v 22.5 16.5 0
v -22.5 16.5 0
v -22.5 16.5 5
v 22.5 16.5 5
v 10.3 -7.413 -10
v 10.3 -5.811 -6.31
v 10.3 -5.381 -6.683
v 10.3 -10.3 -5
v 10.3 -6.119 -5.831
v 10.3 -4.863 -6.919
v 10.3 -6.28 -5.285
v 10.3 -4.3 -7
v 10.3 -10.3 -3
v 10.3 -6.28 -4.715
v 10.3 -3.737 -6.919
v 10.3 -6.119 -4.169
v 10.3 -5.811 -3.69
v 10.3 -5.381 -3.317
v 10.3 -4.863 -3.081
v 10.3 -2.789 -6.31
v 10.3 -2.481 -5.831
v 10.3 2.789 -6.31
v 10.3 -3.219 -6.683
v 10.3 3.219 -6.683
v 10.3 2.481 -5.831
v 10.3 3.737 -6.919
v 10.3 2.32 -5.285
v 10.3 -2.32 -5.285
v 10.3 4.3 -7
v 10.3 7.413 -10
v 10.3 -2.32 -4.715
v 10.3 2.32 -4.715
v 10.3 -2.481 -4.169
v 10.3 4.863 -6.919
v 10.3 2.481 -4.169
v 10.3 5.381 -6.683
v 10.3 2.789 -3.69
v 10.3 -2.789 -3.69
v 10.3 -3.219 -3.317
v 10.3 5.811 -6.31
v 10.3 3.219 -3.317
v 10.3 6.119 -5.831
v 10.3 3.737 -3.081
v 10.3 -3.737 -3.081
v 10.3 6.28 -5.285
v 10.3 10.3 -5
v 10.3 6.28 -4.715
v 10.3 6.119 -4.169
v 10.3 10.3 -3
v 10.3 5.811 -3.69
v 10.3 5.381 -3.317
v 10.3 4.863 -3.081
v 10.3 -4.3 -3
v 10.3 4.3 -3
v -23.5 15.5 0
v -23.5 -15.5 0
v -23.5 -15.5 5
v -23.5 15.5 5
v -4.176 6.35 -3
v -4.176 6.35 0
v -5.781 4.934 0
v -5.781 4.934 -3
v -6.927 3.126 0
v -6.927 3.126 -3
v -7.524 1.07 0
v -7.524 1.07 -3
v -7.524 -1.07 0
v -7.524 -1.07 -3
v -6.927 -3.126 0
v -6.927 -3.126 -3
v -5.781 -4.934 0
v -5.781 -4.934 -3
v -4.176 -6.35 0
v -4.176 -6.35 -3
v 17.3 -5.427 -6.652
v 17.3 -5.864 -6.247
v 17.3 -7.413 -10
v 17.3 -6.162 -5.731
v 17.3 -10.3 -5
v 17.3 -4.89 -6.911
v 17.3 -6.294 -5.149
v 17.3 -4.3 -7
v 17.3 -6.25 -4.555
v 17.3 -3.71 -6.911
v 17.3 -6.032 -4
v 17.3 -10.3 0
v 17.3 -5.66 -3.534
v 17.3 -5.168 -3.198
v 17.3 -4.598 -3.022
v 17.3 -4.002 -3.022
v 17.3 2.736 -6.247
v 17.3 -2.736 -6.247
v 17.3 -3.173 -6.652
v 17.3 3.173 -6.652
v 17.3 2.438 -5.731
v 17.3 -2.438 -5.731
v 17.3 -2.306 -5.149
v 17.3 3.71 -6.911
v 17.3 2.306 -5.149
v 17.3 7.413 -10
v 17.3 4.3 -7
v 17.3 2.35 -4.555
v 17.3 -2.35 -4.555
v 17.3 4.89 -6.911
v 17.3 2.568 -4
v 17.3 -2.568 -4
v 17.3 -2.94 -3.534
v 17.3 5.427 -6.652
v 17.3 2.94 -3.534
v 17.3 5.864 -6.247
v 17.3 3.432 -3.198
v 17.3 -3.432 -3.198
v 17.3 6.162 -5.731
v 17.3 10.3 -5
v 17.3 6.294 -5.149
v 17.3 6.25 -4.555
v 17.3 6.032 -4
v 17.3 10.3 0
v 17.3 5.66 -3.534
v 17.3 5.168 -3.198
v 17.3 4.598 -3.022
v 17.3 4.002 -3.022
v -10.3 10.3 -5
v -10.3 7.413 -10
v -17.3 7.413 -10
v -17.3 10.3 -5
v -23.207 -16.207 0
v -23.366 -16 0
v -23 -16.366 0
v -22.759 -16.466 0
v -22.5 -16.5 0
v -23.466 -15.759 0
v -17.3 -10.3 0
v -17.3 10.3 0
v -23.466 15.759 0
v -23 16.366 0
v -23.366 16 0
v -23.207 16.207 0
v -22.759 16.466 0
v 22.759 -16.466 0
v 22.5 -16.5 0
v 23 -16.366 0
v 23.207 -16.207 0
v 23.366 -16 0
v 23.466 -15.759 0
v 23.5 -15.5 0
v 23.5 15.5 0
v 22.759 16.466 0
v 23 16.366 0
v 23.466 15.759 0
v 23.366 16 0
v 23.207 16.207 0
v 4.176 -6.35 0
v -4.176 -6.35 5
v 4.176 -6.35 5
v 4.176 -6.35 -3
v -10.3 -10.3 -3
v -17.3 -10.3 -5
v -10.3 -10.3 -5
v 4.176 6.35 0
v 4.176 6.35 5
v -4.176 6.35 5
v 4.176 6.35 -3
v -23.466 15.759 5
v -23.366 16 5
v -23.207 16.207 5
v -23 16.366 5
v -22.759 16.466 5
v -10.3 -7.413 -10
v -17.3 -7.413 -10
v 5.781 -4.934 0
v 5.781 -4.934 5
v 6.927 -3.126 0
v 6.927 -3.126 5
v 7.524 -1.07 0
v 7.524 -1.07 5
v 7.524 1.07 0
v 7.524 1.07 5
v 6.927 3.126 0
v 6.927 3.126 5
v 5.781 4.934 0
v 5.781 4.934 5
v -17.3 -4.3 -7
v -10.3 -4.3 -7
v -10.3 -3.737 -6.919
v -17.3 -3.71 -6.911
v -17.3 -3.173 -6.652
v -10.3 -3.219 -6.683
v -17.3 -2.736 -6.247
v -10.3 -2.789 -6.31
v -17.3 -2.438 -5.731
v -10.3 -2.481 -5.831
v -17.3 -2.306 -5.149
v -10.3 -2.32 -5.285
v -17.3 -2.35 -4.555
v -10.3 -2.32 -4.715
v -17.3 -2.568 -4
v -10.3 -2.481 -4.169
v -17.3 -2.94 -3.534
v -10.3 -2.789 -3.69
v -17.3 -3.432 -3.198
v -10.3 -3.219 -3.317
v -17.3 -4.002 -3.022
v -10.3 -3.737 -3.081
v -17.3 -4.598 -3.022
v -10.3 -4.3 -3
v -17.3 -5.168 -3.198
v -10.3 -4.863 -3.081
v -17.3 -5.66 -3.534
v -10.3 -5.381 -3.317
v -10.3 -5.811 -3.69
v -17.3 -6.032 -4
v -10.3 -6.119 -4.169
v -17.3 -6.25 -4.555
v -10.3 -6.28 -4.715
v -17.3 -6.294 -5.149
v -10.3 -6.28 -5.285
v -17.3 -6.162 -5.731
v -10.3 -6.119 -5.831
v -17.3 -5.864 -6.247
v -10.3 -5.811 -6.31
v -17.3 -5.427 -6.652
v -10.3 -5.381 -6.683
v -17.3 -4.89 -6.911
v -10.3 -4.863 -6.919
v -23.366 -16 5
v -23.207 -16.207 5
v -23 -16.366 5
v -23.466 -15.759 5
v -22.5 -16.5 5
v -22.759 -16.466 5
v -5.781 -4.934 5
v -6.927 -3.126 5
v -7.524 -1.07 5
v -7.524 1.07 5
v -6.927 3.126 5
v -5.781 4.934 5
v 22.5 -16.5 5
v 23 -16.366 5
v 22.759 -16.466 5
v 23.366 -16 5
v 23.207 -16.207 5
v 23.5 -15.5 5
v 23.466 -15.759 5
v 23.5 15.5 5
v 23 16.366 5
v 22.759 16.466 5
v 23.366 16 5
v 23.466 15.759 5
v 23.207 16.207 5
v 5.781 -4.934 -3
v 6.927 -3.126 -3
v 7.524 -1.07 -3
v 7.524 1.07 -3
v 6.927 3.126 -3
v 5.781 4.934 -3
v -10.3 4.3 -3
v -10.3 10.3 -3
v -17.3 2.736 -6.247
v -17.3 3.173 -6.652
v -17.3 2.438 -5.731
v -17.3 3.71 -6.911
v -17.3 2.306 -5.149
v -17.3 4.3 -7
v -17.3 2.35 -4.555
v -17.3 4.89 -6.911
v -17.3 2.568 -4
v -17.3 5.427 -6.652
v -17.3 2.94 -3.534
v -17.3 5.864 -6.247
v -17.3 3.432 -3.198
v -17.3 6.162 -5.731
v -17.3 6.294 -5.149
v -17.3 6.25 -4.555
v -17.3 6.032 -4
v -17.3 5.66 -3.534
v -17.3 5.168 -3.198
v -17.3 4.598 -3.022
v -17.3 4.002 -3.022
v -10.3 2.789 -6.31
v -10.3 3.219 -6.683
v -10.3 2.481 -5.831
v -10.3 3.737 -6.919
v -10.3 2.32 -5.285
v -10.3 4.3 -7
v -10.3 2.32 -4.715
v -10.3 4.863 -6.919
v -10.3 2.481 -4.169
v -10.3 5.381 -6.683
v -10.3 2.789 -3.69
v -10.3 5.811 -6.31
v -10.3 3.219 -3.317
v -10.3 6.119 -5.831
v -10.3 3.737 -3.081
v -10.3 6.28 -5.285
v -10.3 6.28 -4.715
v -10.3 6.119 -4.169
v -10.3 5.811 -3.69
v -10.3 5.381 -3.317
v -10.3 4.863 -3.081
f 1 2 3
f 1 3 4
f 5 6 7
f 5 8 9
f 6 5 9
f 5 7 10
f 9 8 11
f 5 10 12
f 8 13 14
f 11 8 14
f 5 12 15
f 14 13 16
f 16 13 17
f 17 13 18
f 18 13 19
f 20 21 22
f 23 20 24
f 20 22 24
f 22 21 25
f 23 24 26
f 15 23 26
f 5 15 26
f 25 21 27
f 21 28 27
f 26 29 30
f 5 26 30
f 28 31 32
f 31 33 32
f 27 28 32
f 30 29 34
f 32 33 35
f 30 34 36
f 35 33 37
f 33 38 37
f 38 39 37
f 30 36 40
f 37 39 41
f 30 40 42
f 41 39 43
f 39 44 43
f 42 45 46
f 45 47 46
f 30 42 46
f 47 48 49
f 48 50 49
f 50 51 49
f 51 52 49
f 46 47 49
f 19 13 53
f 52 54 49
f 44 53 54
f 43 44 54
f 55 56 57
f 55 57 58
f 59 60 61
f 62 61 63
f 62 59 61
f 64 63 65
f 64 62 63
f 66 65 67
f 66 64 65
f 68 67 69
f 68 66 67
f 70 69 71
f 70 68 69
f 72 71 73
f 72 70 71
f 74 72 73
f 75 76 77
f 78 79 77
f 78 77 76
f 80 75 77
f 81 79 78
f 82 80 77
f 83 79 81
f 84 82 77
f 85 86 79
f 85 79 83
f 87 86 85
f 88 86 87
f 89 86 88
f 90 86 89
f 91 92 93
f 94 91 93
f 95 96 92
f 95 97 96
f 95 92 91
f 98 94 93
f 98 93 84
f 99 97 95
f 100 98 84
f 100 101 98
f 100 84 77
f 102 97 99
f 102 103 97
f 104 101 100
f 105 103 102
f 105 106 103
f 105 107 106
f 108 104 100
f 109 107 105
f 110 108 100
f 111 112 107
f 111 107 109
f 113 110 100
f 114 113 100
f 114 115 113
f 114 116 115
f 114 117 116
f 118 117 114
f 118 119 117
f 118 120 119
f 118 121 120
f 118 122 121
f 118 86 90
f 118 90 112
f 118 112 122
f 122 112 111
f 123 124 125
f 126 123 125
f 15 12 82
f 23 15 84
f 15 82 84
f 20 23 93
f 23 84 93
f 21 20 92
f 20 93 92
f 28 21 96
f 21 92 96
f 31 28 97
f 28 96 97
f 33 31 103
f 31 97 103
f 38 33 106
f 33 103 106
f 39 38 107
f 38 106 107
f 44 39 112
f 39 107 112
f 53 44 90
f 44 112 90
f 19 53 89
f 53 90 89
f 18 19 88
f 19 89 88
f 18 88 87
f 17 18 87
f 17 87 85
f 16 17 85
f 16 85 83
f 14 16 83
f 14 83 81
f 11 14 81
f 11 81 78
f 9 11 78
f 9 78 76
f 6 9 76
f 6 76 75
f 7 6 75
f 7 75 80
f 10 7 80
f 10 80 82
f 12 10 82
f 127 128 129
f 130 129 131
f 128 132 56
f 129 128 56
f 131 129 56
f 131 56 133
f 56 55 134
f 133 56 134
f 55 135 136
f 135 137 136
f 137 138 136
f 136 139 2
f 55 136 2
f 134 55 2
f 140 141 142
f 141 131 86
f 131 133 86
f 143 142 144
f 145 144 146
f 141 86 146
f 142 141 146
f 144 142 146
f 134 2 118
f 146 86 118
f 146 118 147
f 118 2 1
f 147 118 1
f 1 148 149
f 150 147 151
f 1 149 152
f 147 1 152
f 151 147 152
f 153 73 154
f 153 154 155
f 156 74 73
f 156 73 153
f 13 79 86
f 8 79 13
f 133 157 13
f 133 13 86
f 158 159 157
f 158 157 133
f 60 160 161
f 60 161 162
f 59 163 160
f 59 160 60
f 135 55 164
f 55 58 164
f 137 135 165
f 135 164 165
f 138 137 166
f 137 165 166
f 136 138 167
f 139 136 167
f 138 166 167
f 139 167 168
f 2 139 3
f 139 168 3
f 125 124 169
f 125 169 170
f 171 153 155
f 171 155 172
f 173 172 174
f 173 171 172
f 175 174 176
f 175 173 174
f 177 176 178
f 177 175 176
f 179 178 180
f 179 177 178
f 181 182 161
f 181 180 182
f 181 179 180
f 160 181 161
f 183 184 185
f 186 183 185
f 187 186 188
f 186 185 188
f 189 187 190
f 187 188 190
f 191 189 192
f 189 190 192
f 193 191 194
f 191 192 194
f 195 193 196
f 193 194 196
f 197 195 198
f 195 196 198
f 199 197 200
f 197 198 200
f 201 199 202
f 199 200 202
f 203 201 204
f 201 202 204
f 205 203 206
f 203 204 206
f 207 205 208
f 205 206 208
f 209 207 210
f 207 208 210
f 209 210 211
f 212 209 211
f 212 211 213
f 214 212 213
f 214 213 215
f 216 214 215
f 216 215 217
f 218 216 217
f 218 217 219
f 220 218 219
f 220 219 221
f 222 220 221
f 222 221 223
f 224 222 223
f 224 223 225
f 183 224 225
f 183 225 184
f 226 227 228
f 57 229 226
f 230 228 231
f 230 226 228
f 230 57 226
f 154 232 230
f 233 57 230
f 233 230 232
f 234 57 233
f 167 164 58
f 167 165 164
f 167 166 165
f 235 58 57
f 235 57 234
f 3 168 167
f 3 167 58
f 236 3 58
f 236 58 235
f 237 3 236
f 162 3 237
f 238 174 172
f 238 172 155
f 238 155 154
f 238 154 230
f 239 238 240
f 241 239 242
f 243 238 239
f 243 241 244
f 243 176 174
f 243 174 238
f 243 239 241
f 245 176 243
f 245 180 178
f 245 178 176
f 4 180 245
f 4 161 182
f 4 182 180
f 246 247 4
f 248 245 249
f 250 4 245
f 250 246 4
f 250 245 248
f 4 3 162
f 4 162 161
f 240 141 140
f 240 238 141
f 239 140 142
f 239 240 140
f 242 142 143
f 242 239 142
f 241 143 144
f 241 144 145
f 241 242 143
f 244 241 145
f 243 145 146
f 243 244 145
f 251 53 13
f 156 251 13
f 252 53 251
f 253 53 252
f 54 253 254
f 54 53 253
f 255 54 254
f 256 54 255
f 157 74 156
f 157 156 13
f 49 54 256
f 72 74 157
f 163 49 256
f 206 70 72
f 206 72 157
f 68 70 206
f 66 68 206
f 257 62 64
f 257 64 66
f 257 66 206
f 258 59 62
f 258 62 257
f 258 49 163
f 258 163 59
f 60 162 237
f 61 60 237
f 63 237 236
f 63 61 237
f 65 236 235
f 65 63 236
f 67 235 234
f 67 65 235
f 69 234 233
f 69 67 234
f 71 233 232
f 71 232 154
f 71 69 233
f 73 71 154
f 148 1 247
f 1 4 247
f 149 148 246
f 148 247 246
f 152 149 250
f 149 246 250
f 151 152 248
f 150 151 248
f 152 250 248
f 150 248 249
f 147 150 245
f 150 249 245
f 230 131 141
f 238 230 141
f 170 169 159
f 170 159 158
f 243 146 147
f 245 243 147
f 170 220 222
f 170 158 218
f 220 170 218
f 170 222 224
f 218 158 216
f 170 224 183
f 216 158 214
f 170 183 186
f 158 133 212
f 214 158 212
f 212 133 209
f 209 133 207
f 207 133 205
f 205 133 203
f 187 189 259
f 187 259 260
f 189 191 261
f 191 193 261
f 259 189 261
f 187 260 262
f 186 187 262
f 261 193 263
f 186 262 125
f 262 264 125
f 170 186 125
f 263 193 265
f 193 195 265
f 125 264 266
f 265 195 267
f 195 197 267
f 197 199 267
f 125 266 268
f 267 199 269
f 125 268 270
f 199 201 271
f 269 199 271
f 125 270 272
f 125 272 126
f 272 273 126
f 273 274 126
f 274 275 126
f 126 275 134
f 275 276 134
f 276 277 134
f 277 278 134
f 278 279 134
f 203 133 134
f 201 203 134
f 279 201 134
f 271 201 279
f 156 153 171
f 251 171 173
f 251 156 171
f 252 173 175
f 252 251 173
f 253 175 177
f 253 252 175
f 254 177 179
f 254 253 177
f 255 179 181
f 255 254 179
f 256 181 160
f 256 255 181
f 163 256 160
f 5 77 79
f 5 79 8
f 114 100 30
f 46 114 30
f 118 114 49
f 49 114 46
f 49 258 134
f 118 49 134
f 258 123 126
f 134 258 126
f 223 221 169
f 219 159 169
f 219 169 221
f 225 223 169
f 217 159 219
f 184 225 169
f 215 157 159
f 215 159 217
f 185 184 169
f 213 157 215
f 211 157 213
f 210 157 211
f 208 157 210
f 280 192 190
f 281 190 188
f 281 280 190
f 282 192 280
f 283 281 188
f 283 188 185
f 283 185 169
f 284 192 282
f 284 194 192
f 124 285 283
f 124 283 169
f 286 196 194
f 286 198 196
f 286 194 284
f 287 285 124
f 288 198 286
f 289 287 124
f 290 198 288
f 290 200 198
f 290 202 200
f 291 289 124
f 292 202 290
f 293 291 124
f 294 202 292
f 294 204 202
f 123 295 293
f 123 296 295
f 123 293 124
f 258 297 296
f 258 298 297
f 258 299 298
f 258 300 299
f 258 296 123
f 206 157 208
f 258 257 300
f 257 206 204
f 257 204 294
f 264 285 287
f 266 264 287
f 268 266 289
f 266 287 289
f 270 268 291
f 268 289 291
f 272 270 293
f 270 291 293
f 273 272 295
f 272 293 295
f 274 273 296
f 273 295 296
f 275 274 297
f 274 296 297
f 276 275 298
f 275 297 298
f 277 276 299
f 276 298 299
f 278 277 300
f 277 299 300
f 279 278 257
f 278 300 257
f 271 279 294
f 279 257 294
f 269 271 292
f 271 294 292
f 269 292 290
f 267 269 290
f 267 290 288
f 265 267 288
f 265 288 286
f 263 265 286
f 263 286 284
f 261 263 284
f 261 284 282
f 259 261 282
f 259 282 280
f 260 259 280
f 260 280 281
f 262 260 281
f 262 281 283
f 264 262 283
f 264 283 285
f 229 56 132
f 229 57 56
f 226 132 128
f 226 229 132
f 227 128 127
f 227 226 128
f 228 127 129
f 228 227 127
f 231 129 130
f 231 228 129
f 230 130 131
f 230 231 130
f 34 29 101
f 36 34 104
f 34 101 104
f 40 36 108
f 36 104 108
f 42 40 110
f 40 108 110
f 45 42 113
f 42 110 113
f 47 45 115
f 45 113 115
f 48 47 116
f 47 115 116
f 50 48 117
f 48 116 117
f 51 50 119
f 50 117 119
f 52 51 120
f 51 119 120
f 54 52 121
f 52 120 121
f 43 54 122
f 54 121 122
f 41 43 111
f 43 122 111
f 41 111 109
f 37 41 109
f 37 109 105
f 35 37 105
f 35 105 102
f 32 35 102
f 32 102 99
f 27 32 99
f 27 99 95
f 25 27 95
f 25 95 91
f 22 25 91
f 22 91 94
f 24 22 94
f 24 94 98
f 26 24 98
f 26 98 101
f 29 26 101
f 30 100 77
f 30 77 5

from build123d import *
from OCP.BRepFilletAPI import BRepFilletAPI_MakeChamfer

# Parameters (mm, degrees)
SZKIC1_W                    = 47
SZKIC1_H                    = 33
SZKIC1_R                    = 7.6
DODANIE_WYCI_GNI_CIE1_DEPTH = 5
SZKIC2_W                    = 7
SZKIC2_H                    = 20.6
DODANIE_WYCI_GNI_CIE2_DEPTH = 10
SFAZOWANIE1_SIZE            = 5
SFAZOWANIE1_SIZE2           = 2.886751346
SZKIC3_R                    = 2
WYTNIJ_WYCI_GNI_CIE1_DEPTH  = 46.131917752
ZAOKR_GLENIE1_R             = 1
DODANIE_WYCI_GNI_CIE4_START = 3
SZKIC5_W                    = 20.6
SZKIC5_H                    = 20.6
DODANIE_WYCI_GNI_CIE4_DEPTH = 3


with BuildPart() as part:
    # Szkic1 → Dodanie-wyciągnięcie1 (new body)
    # profile 1 of 3: a face of its own
    with BuildSketch(Plane.XY):
        Rectangle(SZKIC1_W, SZKIC1_H)
        Circle(SZKIC1_R, mode=Mode.SUBTRACT)
    # profile 2 of 3: a face of its own
    with BuildSketch(Plane.XY):
        with BuildLine():
            Line((4.175823272, -6.35), (-4.175823272, -6.35))
            ThreePointArc((-4.175823272, -6.35), (0, -7.6), (4.175823272, -6.35))
        make_face()
    # profile 3 of 3: a face of its own
    with BuildSketch(Plane.XY):
        with BuildLine():
            ThreePointArc((4.175823272, 6.35), (0, 7.6), (-4.175823272, 6.35))
            Line((-4.175823272, 6.35), (4.175823272, 6.35))
        make_face()
    extrude(amount=DODANIE_WYCI_GNI_CIE1_DEPTH)

    # Szkic2 → Dodanie-wyciągnięcie2 (add)
    with BuildSketch(Plane(origin=(0, 0, 0), x_dir=(-1, 0, 0), z_dir=(0, 0, -1))):
        with Locations((-13.8, 0)):
            Rectangle(SZKIC2_W, SZKIC2_H)
        with Locations((13.8, 0)):
            Rectangle(SZKIC2_W, SZKIC2_H)
    extrude(amount=DODANIE_WYCI_GNI_CIE2_DEPTH)

    # Sfazowanie1: one chamfer whose edges measure the first distance from different faces: ONE call of the kernel's chamfer builder (chamfer() names one face for all edges)
    sfazowanie1_edges_1 = [part.edges().sort_by_distance(p)[0] for p in [
        (13.8, 10.3, -10),
    ]]
    sfazowanie1_side_1 = [part.faces().sort_by_distance(p)[0] for p in [
        (13.8, 10.3, -5),
    ]]
    sfazowanie1_edges_2 = [part.edges().sort_by_distance(p)[0] for p in [
        (13.8, -10.3, -10),
    ]]
    sfazowanie1_side_2 = [part.faces().sort_by_distance(p)[0] for p in [
        (13.8, -10.3, -5),
    ]]
    sfazowanie1_edges_3 = [part.edges().sort_by_distance(p)[0] for p in [
        (-13.8, 10.3, -10),
    ]]
    sfazowanie1_side_3 = [part.faces().sort_by_distance(p)[0] for p in [
        (-13.8, 10.3, -5),
    ]]
    sfazowanie1_edges_4 = [part.edges().sort_by_distance(p)[0] for p in [
        (-13.8, -10.3, -10),
    ]]
    sfazowanie1_side_4 = [part.faces().sort_by_distance(p)[0] for p in [
        (-13.8, -10.3, -5),
    ]]
    sfazowanie1 = BRepFilletAPI_MakeChamfer(part.part.solid().wrapped)
    for e in sfazowanie1_edges_1:
        sfazowanie1.Add(SFAZOWANIE1_SIZE, SFAZOWANIE1_SIZE2, e.wrapped, sfazowanie1_side_1[0].wrapped)  # the first distance lies on this face
    for e in sfazowanie1_edges_2:
        sfazowanie1.Add(SFAZOWANIE1_SIZE, SFAZOWANIE1_SIZE2, e.wrapped, sfazowanie1_side_2[0].wrapped)  # the first distance lies on this face
    for e in sfazowanie1_edges_3:
        sfazowanie1.Add(SFAZOWANIE1_SIZE, SFAZOWANIE1_SIZE2, e.wrapped, sfazowanie1_side_3[0].wrapped)  # the first distance lies on this face
    for e in sfazowanie1_edges_4:
        sfazowanie1.Add(SFAZOWANIE1_SIZE, SFAZOWANIE1_SIZE2, e.wrapped, sfazowanie1_side_4[0].wrapped)  # the first distance lies on this face
    add(Compound.cast(sfazowanie1.Shape()), mode=Mode.REPLACE)

    # Szkic3 → Wytnij-wyciągnięcie1 (cut, through all)
    with BuildSketch(Plane(origin=(17.3, 0, 0), x_dir=(0, 0, -1), z_dir=(1, 0, 0))):
        with Locations((5, 4.3)):
            Circle(SZKIC3_R)
        with Locations((5, -4.3)):
            Circle(SZKIC3_R)
    extrude(amount=-WYTNIJ_WYCI_GNI_CIE1_DEPTH, mode=Mode.SUBTRACT)

    # Zaokrąglenie1
    zaokr_glenie1_edges = [part.edges().sort_by_distance(p)[0] for p in [
        (-23.5, -16.5, 2.5),
        (-23.5, 16.5, 2.5),
        (23.5, 16.5, 2.5),
        (23.5, -16.5, 2.5),
    ]]
    fillet(zaokr_glenie1_edges, radius=ZAOKR_GLENIE1_R)

    # Szkic5 → Dodanie-wyciągnięcie4 (add)
    with BuildSketch(Plane(origin=(0, 0, 0), x_dir=(-1, 0, 0), z_dir=(0, 0, -1)).offset(DODANIE_WYCI_GNI_CIE4_START)):
        Rectangle(SZKIC5_W, SZKIC5_H)
        with BuildLine():
            Line((4.175823272, -6.35), (-4.175823272, -6.35))
            ThreePointArc((-4.175823272, -6.35), (-7.6, 0), (-4.175823272, 6.35))
            Line((-4.175823272, 6.35), (4.175823272, 6.35))
            ThreePointArc((4.175823272, 6.35), (7.6, 0), (4.175823272, -6.35))
        make_face(mode=Mode.SUBTRACT)
    extrude(amount=-DODANIE_WYCI_GNI_CIE4_DEPTH)


solid = part.part
